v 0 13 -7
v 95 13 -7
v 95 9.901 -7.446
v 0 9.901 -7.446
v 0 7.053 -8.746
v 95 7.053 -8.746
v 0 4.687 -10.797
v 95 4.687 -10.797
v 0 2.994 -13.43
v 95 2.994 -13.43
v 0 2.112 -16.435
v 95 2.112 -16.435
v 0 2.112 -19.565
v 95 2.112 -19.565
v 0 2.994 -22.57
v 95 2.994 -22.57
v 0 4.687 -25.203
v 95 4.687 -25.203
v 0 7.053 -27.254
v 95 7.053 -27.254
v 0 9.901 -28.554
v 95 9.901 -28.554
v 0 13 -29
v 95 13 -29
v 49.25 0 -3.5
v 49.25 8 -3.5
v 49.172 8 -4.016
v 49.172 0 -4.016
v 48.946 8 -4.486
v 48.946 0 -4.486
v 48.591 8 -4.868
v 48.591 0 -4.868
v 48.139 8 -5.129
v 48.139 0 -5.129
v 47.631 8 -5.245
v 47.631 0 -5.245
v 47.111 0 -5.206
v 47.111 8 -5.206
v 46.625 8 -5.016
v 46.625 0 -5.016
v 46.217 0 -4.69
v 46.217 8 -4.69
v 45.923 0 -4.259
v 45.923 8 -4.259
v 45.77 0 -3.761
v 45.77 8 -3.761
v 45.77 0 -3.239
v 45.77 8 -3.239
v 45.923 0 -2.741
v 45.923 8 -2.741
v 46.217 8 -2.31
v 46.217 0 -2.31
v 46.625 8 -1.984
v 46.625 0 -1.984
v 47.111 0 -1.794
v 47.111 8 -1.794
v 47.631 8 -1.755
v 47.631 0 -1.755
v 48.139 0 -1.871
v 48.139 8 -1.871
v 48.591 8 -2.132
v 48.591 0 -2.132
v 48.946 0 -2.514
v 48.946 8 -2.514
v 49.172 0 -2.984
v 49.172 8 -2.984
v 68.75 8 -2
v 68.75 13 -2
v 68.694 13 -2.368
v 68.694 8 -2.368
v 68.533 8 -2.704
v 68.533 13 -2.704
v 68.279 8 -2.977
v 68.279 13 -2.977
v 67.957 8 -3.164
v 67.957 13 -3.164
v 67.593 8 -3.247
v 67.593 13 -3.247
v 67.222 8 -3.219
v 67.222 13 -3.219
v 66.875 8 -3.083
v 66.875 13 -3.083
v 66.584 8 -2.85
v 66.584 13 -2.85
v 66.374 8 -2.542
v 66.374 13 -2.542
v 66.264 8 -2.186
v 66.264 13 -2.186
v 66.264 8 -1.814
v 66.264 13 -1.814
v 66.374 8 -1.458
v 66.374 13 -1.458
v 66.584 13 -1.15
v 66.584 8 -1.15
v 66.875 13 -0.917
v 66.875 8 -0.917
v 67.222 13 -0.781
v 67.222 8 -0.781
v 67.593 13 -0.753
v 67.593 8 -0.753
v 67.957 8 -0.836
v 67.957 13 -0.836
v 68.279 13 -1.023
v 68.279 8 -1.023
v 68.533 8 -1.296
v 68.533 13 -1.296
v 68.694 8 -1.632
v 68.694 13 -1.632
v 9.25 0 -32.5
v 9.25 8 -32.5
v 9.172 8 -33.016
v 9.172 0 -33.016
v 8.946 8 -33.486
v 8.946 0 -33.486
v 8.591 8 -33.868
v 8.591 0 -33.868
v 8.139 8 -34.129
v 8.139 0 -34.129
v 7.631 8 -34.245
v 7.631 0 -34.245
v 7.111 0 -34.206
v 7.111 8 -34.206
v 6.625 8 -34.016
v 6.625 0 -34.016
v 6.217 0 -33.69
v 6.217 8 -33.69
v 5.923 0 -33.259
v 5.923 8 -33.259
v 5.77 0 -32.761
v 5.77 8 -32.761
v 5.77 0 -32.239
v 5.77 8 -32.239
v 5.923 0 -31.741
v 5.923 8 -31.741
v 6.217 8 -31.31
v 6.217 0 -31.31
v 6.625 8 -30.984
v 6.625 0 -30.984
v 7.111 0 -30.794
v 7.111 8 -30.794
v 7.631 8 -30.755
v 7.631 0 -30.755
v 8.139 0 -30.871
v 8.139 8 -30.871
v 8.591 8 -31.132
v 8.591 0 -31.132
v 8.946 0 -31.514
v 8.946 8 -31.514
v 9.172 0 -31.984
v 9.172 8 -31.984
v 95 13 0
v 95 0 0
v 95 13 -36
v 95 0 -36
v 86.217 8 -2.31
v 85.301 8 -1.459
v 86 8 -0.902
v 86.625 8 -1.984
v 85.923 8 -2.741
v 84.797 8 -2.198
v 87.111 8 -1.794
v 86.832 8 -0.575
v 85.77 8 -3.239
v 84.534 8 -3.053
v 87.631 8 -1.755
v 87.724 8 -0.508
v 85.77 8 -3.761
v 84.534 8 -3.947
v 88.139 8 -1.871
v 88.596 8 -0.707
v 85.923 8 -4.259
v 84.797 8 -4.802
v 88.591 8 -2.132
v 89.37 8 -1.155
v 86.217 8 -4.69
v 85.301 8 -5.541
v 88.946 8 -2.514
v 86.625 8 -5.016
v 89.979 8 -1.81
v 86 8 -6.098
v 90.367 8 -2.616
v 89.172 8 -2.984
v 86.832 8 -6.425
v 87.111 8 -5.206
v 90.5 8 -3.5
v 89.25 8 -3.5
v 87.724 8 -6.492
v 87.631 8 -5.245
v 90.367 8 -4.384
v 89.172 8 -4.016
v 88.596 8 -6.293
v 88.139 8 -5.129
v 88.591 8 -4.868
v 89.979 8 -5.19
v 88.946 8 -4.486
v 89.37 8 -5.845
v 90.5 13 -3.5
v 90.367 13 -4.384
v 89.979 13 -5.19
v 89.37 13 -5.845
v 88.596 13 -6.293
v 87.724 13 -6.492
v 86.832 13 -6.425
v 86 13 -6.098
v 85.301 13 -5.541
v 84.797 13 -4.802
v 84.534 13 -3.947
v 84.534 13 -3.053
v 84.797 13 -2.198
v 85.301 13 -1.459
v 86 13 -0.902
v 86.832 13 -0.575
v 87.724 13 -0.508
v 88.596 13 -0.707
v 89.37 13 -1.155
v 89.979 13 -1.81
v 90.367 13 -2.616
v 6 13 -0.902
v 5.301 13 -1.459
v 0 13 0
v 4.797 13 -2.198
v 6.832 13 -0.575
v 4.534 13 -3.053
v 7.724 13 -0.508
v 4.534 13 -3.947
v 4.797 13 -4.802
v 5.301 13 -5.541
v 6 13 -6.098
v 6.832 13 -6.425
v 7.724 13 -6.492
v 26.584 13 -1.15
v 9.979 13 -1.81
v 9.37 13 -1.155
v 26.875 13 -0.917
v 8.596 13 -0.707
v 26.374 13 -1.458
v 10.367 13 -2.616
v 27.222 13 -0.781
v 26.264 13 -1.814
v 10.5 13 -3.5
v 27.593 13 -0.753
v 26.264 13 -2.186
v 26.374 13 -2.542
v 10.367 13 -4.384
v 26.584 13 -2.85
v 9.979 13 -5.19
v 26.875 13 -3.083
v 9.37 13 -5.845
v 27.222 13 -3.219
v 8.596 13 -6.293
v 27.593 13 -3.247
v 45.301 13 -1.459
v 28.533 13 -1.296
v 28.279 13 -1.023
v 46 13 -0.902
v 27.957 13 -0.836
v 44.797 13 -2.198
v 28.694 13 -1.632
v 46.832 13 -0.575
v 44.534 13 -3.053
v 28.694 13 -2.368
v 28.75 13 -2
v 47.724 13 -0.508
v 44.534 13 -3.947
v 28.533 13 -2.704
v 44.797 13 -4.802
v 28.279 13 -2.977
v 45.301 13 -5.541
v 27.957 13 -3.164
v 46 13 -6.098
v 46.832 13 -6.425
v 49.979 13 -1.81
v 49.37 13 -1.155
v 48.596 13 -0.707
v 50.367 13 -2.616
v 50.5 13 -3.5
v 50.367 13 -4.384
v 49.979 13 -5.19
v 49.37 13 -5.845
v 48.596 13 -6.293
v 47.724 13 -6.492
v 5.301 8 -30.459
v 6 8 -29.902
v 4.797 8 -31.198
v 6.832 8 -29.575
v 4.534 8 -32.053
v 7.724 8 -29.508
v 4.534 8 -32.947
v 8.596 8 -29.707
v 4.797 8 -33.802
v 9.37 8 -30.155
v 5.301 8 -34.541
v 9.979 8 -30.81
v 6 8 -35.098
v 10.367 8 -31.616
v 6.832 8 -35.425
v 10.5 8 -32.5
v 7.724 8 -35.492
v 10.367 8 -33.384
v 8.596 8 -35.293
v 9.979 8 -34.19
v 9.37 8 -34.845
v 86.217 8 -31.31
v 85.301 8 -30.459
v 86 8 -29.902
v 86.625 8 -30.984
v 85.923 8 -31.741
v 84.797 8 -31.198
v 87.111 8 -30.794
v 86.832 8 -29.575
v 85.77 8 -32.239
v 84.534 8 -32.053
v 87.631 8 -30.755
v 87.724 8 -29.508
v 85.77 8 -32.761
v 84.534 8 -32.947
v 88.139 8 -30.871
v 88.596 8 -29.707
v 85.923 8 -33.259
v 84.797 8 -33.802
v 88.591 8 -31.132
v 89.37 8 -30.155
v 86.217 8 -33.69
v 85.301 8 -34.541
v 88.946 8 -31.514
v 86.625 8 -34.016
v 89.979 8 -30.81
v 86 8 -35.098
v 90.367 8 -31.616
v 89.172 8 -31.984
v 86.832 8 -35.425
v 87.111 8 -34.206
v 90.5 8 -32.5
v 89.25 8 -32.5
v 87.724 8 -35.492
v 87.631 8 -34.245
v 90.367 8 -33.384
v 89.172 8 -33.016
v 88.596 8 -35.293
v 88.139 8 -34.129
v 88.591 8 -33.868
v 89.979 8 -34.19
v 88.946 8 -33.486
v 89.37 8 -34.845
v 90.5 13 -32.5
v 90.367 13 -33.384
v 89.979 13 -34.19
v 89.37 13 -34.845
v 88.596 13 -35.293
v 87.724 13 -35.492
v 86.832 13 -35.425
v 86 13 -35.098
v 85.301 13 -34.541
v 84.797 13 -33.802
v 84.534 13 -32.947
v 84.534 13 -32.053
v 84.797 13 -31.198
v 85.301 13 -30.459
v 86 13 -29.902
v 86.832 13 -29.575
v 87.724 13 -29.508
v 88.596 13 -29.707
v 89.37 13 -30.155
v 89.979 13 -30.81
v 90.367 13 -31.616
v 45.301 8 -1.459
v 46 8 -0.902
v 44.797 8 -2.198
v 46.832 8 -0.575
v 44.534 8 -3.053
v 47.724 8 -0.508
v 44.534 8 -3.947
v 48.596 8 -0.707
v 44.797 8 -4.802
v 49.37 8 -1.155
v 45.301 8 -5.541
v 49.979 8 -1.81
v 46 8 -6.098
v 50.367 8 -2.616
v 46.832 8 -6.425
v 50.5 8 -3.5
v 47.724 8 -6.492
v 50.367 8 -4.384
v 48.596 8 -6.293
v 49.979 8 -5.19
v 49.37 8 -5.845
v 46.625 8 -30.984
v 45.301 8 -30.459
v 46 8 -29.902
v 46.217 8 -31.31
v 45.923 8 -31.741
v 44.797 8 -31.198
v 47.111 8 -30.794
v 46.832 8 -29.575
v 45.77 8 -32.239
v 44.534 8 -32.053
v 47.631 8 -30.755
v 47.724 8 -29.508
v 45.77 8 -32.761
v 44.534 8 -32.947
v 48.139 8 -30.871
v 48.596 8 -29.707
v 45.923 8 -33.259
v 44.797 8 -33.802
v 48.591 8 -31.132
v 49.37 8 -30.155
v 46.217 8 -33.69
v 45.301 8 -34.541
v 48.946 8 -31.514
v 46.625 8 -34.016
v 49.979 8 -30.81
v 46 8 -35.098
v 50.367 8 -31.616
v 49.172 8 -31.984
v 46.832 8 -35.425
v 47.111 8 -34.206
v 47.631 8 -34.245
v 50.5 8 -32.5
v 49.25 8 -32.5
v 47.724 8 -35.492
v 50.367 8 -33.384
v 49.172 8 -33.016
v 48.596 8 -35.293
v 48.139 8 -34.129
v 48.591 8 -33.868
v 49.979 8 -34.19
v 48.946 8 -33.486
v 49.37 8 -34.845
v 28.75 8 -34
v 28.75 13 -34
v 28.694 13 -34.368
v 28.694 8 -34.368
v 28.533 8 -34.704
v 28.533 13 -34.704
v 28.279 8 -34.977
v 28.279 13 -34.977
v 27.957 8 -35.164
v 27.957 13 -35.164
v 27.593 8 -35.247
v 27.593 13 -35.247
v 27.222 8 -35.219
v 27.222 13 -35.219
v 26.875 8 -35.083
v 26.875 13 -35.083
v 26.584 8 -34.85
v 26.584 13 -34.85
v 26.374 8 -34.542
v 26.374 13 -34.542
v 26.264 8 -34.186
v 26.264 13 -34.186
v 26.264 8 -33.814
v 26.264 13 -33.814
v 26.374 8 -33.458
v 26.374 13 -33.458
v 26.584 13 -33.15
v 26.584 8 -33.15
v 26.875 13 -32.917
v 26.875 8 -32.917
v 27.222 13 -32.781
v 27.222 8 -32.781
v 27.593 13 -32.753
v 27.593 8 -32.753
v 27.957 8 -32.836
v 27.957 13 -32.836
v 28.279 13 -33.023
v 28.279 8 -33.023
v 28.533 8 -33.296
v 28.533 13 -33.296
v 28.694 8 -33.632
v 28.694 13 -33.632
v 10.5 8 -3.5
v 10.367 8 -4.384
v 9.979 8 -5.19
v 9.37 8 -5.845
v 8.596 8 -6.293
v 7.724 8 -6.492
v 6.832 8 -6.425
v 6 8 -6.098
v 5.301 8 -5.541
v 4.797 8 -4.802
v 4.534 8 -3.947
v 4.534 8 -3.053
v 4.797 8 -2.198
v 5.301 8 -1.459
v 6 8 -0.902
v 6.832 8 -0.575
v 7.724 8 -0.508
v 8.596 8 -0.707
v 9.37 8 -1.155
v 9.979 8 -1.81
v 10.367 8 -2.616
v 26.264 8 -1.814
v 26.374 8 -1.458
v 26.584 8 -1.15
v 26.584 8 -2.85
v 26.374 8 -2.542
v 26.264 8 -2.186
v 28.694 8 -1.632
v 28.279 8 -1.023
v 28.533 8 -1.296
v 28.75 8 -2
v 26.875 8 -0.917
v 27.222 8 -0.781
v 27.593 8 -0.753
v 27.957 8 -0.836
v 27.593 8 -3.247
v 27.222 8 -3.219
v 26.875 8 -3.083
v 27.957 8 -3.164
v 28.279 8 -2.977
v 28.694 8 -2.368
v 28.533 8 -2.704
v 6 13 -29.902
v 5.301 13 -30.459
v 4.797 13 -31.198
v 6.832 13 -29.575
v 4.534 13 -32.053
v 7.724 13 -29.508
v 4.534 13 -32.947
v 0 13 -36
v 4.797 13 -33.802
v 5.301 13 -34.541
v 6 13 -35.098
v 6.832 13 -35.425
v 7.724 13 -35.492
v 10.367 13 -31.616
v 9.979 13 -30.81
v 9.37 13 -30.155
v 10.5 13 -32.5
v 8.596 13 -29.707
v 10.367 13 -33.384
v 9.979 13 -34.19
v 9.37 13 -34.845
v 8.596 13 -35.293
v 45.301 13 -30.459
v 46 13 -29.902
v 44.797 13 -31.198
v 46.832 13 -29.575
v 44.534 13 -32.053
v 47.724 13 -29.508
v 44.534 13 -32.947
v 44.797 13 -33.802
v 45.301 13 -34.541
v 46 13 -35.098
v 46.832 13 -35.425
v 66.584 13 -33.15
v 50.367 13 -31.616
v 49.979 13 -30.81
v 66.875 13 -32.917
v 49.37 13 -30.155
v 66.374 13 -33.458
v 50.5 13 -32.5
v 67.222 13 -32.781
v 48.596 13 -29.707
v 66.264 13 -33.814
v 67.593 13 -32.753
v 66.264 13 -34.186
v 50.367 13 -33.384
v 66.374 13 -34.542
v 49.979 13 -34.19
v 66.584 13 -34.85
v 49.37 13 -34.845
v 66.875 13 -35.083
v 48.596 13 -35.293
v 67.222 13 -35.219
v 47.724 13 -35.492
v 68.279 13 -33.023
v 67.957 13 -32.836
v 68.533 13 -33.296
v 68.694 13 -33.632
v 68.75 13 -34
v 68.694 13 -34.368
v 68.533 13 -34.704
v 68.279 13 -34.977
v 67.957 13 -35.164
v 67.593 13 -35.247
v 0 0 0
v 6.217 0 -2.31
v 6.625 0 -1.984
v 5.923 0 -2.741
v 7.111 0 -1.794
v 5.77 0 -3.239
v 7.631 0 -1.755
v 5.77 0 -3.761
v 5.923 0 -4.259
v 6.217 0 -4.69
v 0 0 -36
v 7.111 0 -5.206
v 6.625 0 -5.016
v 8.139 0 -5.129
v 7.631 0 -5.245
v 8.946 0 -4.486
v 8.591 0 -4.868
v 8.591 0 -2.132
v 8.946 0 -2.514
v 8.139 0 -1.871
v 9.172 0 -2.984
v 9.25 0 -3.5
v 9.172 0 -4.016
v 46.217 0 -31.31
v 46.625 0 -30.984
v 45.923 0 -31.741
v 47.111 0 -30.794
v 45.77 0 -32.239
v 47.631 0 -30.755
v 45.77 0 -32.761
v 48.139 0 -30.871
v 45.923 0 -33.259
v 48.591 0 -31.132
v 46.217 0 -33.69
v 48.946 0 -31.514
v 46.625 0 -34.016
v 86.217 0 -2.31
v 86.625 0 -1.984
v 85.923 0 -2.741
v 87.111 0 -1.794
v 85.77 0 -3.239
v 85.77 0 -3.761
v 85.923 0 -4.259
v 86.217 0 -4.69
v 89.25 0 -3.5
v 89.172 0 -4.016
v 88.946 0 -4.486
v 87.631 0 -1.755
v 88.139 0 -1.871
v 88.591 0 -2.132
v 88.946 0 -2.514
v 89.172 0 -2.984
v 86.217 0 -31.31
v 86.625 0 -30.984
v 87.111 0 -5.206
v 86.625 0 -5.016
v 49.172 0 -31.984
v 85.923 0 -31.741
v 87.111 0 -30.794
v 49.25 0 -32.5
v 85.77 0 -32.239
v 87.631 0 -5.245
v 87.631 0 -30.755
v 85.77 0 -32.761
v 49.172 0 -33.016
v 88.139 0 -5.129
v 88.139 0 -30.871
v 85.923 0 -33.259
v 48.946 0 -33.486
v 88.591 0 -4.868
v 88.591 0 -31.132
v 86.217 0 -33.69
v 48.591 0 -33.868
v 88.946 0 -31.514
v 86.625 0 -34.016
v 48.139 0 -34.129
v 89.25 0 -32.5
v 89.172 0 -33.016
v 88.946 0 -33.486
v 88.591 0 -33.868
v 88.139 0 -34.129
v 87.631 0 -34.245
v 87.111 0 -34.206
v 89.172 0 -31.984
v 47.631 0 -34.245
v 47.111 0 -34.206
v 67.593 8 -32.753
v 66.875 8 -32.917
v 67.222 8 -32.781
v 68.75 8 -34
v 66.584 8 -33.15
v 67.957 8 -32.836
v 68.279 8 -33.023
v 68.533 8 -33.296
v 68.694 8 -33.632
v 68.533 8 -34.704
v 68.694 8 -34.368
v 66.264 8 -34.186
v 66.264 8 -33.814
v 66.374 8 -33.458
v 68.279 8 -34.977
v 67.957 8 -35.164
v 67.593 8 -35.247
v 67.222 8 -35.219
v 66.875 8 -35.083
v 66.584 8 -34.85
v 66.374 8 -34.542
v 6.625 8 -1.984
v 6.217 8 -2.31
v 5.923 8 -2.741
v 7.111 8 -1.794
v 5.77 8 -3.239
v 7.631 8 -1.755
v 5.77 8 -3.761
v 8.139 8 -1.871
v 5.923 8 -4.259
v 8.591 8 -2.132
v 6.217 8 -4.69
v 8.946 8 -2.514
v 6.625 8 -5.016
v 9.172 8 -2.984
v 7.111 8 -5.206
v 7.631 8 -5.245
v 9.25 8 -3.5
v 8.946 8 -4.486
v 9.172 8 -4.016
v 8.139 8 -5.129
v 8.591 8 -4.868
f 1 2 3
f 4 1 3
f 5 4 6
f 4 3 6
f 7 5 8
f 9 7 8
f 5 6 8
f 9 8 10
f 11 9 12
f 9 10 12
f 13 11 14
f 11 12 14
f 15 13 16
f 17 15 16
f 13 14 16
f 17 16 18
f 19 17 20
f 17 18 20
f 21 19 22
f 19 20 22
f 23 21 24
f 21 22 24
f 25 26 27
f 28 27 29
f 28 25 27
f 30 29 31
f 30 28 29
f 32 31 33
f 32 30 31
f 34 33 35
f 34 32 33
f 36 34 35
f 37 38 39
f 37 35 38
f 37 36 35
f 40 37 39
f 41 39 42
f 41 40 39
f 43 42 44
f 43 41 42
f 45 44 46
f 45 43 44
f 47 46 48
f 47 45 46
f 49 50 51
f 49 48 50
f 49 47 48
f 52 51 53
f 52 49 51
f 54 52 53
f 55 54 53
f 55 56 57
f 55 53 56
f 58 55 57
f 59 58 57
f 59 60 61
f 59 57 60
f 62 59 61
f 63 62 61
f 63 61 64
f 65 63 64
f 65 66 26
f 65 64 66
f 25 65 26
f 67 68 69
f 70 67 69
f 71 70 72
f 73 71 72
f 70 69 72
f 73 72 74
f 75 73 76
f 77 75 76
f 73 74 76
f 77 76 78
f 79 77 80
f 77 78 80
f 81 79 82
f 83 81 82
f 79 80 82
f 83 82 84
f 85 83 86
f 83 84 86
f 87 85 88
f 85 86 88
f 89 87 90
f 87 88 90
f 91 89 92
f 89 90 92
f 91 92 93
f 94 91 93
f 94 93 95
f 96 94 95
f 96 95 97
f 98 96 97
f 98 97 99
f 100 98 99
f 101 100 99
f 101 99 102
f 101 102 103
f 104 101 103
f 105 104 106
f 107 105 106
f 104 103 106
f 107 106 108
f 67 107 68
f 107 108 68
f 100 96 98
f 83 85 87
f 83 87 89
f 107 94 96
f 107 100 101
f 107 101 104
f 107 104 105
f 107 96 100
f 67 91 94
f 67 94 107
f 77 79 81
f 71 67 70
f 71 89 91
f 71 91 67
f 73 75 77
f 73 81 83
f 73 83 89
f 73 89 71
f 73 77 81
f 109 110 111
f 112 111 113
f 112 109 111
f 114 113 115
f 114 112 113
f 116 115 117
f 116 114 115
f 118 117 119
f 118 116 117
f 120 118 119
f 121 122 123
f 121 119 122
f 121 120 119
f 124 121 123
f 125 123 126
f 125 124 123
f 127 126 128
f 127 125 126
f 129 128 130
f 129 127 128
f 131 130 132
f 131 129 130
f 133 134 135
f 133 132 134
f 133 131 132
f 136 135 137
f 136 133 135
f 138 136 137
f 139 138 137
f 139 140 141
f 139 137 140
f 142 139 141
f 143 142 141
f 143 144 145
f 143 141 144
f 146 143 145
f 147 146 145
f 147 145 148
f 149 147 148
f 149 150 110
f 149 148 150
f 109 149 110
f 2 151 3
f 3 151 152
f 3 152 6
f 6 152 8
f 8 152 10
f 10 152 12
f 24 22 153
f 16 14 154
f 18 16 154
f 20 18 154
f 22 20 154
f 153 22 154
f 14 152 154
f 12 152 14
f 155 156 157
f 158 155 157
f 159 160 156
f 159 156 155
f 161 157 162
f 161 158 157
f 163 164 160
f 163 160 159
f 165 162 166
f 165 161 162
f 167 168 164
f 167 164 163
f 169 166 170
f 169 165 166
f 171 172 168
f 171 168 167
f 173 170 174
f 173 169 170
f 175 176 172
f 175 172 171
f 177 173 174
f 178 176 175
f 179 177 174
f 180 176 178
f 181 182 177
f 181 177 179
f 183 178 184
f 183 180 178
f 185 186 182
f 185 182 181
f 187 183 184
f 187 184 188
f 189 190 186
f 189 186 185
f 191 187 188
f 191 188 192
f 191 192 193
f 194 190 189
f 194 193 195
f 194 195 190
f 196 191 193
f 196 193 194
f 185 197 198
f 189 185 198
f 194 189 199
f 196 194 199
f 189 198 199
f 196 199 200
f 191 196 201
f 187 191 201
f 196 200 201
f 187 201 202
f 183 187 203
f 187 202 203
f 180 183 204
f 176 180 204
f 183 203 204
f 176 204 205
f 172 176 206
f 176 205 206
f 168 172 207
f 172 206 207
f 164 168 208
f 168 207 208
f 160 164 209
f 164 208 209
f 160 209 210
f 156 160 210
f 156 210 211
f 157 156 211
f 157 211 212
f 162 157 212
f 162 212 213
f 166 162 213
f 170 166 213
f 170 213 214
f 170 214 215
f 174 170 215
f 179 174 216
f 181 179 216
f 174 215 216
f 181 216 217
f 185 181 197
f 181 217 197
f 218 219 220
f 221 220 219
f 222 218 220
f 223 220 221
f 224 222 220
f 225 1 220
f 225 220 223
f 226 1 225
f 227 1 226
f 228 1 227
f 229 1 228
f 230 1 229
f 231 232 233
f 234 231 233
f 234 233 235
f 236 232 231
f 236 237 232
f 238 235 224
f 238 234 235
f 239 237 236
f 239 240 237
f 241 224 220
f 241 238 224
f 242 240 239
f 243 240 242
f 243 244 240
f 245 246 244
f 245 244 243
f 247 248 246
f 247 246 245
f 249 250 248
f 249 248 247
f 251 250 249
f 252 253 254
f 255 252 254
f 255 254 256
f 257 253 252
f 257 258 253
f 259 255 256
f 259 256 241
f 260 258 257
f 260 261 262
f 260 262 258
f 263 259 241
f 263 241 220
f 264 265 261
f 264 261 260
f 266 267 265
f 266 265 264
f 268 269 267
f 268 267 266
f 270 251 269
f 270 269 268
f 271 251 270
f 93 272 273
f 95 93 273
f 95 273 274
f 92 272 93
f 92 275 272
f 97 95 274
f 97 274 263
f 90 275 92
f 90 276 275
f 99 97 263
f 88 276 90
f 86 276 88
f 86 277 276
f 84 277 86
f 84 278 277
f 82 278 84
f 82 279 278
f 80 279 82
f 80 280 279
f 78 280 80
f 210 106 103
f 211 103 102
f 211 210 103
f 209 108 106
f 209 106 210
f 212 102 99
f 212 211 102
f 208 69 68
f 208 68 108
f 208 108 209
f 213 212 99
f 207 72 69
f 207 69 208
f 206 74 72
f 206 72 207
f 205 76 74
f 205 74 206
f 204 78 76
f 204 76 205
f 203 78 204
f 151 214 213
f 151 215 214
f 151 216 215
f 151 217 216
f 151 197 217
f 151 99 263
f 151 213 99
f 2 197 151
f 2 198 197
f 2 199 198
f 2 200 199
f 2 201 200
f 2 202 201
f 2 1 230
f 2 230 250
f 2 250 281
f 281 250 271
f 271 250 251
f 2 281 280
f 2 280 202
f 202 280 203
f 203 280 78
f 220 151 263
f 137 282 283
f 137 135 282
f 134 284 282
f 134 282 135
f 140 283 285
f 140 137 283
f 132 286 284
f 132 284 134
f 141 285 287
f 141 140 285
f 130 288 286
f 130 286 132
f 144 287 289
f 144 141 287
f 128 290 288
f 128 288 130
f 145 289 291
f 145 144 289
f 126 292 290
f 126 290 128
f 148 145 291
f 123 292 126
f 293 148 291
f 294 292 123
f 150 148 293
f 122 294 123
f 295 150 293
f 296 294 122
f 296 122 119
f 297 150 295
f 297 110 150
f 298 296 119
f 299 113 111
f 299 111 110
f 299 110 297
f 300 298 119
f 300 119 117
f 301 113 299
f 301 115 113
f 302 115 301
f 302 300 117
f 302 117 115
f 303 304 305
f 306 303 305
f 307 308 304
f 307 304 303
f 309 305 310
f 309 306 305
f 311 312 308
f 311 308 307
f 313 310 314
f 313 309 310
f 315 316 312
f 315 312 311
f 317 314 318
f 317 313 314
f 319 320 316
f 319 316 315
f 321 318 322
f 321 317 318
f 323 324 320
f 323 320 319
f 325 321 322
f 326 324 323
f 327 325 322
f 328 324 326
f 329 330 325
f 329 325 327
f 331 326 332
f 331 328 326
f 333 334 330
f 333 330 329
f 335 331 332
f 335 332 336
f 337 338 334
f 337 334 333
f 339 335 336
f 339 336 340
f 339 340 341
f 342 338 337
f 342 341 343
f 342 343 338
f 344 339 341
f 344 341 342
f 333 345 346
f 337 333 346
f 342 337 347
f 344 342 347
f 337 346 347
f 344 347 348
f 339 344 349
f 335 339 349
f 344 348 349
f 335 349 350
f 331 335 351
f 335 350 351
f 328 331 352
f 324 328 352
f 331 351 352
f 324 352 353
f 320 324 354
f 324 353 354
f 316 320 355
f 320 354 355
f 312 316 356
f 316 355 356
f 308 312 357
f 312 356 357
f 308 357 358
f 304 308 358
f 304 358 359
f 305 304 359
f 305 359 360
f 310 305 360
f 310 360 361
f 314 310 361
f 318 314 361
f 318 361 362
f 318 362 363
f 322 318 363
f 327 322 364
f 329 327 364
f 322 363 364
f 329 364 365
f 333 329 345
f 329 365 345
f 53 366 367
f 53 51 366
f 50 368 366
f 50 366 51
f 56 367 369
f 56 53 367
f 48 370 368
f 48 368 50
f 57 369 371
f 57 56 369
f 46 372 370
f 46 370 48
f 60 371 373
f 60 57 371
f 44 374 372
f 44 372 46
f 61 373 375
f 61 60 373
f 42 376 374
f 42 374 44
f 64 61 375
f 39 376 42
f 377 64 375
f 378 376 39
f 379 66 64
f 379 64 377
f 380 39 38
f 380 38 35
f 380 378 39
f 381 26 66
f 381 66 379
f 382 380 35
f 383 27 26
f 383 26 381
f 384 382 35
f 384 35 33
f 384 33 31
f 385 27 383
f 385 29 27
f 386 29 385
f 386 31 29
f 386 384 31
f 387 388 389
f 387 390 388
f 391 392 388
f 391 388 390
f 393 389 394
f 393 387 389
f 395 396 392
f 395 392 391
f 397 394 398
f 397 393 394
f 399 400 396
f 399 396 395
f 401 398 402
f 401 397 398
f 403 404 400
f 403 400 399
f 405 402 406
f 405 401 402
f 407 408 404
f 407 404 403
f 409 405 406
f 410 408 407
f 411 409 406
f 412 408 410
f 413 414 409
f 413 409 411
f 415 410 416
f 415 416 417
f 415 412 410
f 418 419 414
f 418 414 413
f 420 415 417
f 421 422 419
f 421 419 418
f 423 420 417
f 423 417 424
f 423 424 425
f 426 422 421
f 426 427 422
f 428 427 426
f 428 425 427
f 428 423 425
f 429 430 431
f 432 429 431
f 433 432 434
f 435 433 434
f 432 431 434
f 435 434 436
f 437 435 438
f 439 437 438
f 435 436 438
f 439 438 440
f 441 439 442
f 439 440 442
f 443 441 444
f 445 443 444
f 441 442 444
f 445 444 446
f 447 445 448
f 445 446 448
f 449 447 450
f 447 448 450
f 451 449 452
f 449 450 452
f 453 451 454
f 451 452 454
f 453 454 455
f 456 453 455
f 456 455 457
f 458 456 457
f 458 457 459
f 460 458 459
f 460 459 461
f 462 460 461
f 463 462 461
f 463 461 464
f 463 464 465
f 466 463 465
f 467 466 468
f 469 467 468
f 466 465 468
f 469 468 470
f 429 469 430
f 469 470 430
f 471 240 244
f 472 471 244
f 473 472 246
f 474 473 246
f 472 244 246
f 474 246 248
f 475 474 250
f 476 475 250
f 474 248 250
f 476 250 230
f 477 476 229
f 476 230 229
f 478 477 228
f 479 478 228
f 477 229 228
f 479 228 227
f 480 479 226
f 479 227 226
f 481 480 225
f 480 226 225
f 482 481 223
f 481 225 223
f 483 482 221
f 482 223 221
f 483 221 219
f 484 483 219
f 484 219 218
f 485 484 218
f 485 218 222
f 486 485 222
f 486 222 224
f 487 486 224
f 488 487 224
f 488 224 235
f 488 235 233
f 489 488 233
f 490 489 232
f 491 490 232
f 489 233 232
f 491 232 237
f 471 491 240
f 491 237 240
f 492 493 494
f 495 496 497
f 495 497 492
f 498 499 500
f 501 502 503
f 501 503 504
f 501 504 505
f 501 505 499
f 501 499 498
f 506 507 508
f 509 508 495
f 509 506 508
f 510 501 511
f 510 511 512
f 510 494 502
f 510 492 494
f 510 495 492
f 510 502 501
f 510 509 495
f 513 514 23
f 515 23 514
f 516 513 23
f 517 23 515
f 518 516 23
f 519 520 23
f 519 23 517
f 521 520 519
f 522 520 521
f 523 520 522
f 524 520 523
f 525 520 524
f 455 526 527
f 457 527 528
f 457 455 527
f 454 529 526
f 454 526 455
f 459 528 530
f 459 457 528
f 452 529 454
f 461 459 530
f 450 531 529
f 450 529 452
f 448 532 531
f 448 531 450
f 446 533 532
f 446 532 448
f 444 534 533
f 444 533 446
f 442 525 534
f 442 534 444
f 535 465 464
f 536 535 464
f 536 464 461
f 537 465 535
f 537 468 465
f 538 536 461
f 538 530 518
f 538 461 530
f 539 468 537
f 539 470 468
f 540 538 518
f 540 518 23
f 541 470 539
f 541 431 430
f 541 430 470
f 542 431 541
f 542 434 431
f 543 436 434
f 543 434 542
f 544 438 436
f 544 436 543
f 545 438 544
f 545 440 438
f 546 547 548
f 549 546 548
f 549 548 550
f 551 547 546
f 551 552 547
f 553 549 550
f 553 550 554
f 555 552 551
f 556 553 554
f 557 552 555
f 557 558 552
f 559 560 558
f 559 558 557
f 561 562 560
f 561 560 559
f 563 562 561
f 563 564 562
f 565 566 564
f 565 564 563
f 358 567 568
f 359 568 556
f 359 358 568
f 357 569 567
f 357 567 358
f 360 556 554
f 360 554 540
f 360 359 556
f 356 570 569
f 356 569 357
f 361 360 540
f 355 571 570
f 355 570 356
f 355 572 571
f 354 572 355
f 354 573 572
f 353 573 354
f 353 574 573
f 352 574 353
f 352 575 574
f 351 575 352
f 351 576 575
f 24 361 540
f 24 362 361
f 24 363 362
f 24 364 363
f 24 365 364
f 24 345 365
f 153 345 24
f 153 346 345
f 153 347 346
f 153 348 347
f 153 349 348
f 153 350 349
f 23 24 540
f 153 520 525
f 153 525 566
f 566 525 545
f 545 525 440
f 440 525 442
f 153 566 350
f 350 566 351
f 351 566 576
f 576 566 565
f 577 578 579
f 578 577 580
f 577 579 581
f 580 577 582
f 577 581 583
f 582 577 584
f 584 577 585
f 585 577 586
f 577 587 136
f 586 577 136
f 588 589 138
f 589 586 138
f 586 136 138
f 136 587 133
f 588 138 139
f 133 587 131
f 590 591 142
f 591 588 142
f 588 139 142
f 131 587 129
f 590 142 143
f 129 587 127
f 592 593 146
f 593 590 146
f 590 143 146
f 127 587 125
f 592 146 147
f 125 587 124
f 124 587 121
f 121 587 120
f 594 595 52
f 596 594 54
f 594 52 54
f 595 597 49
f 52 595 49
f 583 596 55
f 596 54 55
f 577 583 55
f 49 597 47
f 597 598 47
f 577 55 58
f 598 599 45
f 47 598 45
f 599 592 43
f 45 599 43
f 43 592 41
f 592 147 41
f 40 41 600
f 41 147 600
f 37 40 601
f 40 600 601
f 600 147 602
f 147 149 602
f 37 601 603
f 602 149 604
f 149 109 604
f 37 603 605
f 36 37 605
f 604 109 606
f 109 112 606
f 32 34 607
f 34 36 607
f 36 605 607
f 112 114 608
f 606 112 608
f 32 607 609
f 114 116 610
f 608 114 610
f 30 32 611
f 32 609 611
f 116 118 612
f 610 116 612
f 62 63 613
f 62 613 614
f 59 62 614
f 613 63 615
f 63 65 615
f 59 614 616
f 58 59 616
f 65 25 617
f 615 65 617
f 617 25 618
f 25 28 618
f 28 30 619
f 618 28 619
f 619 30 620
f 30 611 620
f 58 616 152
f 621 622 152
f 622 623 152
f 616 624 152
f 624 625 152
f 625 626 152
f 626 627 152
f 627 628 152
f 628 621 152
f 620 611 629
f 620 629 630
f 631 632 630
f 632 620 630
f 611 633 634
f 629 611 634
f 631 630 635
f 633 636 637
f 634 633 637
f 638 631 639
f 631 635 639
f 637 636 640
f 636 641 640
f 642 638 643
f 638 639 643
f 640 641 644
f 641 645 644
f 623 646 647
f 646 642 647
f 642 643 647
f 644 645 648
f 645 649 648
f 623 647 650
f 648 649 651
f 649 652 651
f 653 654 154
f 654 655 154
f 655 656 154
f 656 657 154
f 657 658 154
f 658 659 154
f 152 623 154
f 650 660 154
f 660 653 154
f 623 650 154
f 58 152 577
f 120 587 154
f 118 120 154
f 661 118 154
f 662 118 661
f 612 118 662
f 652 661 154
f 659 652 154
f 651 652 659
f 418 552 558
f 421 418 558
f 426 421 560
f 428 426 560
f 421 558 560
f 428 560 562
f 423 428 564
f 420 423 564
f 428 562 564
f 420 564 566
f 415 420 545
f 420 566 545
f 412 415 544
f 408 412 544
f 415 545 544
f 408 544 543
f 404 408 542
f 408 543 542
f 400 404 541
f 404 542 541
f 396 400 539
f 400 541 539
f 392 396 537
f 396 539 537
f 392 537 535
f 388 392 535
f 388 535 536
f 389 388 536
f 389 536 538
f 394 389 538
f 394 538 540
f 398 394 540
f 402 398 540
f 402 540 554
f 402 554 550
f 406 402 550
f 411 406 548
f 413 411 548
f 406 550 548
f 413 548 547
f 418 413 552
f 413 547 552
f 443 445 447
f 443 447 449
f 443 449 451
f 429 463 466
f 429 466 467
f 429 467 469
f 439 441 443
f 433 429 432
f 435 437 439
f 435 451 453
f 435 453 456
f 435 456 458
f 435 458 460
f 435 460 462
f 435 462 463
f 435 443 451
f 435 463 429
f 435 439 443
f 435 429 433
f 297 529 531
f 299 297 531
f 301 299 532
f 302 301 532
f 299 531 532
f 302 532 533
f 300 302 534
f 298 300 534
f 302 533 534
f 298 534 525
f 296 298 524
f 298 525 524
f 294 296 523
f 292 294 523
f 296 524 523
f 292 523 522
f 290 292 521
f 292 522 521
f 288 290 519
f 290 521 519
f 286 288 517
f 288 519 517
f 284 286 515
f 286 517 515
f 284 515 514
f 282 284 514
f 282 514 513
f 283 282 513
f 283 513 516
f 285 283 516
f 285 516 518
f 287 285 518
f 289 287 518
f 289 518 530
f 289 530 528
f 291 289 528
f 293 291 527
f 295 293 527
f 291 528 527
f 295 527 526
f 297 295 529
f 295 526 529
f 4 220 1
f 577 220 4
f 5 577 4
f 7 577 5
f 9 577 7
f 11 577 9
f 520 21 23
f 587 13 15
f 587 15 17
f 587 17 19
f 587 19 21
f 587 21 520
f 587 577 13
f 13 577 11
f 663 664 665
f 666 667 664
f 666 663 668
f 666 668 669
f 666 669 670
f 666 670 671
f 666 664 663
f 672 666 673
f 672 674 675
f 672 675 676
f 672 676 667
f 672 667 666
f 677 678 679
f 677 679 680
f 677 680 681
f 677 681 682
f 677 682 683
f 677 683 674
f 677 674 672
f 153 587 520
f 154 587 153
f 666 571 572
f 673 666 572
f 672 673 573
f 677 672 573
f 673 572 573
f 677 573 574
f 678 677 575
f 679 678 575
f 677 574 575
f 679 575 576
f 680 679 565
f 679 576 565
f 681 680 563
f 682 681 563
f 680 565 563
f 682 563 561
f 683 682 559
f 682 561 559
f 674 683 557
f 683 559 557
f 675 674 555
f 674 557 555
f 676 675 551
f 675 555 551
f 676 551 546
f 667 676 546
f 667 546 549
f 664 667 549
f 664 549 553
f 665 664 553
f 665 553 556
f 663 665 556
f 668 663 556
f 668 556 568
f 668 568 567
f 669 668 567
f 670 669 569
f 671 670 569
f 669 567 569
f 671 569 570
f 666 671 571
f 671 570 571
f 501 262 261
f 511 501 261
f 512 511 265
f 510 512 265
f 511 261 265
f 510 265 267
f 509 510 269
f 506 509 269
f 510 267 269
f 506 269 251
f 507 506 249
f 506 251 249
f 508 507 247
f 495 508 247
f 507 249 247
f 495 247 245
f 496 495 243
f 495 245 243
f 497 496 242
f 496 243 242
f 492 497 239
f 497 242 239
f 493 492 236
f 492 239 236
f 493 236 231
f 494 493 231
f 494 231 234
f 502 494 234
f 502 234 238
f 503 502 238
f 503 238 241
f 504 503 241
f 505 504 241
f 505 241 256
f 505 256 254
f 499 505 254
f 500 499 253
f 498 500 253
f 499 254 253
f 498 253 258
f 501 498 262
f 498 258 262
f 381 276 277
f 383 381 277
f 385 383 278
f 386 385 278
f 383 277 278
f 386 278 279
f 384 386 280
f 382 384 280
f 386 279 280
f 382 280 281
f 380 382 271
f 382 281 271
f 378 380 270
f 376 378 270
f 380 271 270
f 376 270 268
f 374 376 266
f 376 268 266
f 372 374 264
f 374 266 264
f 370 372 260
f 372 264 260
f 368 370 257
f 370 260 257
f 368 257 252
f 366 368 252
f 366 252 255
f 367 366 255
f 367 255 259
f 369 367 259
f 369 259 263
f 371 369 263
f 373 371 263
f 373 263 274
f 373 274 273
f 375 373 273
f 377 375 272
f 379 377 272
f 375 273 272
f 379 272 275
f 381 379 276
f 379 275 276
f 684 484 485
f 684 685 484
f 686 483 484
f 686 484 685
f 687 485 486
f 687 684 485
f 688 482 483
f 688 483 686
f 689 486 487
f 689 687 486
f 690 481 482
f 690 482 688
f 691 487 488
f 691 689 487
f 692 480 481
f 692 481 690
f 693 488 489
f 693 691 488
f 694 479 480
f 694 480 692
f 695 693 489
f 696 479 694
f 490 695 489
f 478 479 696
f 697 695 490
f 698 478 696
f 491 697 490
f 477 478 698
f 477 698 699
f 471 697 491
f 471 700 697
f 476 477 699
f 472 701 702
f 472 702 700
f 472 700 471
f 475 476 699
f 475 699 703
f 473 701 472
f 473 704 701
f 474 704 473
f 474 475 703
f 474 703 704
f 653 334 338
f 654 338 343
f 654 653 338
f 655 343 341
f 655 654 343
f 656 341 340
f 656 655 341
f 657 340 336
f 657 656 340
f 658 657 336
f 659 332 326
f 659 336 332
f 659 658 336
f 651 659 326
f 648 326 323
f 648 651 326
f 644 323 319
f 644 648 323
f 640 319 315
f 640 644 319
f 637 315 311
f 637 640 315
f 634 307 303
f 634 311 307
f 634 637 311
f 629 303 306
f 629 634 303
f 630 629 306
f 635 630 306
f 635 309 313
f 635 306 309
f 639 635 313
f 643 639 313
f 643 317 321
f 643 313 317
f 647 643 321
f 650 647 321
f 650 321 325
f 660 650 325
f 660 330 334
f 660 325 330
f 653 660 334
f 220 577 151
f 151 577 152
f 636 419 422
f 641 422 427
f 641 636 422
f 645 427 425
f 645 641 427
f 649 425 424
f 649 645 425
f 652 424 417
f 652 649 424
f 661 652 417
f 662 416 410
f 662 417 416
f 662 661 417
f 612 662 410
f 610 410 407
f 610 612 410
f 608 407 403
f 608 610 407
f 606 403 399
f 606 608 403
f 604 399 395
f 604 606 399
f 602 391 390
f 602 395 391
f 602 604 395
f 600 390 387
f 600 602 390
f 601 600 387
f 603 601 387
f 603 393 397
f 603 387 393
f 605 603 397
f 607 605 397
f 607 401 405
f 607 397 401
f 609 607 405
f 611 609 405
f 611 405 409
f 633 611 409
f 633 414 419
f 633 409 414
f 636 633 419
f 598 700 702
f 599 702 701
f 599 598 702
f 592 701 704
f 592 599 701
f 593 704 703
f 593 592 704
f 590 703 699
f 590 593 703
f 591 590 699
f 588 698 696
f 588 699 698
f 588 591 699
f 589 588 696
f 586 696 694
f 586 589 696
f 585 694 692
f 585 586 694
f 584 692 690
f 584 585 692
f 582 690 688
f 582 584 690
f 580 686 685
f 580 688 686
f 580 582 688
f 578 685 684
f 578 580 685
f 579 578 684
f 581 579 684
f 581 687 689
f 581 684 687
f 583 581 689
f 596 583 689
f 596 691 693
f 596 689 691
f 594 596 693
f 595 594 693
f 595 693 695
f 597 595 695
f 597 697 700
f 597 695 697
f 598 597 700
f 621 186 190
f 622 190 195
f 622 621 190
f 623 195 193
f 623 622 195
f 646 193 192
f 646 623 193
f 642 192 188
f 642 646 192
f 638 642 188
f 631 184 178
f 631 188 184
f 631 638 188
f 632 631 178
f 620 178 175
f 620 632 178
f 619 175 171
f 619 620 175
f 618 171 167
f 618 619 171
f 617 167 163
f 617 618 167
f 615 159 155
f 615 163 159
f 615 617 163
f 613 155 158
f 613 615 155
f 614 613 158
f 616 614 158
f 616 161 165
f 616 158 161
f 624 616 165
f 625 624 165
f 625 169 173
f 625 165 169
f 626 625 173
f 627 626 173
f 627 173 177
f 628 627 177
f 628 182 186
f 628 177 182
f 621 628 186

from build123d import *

# Parameters (mm, degrees)
SKETCH_1_W          = 95
SKETCH_1_H          = 36
SKETCH_1_R          = 1.75
EXTRUDE_1_DEPTH     = 13
SKETCH_2_R          = 11
CUT_EXTRUDE_1_DEPTH = 96
SKETCH_4_R          = 3
SKETCH_4_R_2        = 1.25
CUT_EXTRUDE_2_DEPTH = 5


with BuildPart() as part:
    # Эскиз1 → Бобышка-Вытянуть1 (new body)
    with BuildSketch(Plane(origin=(0, 0, 0), x_dir=(1, 0, 0), z_dir=(0, 1, 0))):
        with Locations((47.5, 18)):
            Rectangle(SKETCH_1_W, SKETCH_1_H)
        with Locations((7.5, 32.5)):
            Circle(SKETCH_1_R, mode=Mode.SUBTRACT)
        with Locations((47.5, 32.5)):
            Circle(SKETCH_1_R, mode=Mode.SUBTRACT)
        with Locations((87.5, 32.5)):
            Circle(SKETCH_1_R, mode=Mode.SUBTRACT)
        with Locations((87.5, 3.5)):
            Circle(SKETCH_1_R, mode=Mode.SUBTRACT)
        with Locations((47.5, 3.5)):
            Circle(SKETCH_1_R, mode=Mode.SUBTRACT)
        with Locations((7.5, 3.5)):
            Circle(SKETCH_1_R, mode=Mode.SUBTRACT)
    extrude(amount=EXTRUDE_1_DEPTH)

    # Эскиз2 → Вырез-Вытянуть1 (cut, through all)
    with BuildSketch(Plane(origin=(95, 0, 0), x_dir=(0, 0, -1), z_dir=(1, 0, 0))):
        with Locations((18, 13)):
            Circle(SKETCH_2_R)
    extrude(amount=-CUT_EXTRUDE_1_DEPTH, mode=Mode.SUBTRACT)

    # Эскиз4 → Вырез-Вытянуть2 (cut)
    with BuildSketch(Plane(origin=(0, 13, 0), x_dir=(1, 0, 0), z_dir=(0, 1, 0))):
        with Locations((7.5, 32.5)):
            Circle(SKETCH_4_R)
        with Locations((47.5, 32.5)):
            Circle(SKETCH_4_R)
        with Locations((87.5, 32.5)):
            Circle(SKETCH_4_R)
        with Locations((87.5, 3.5)):
            Circle(SKETCH_4_R)
        with Locations((47.5, 3.5)):
            Circle(SKETCH_4_R)
        with Locations((7.5, 3.5)):
            Circle(SKETCH_4_R)
        with Locations((27.5, 34)):
            Circle(SKETCH_4_R_2)
        with Locations((67.5, 34)):
            Circle(SKETCH_4_R_2)
        with Locations((67.5, 2)):
            Circle(SKETCH_4_R_2)
        with Locations((27.5, 2)):
            Circle(SKETCH_4_R_2)
    extrude(amount=-CUT_EXTRUDE_2_DEPTH, mode=Mode.SUBTRACT)


solid = part.part
